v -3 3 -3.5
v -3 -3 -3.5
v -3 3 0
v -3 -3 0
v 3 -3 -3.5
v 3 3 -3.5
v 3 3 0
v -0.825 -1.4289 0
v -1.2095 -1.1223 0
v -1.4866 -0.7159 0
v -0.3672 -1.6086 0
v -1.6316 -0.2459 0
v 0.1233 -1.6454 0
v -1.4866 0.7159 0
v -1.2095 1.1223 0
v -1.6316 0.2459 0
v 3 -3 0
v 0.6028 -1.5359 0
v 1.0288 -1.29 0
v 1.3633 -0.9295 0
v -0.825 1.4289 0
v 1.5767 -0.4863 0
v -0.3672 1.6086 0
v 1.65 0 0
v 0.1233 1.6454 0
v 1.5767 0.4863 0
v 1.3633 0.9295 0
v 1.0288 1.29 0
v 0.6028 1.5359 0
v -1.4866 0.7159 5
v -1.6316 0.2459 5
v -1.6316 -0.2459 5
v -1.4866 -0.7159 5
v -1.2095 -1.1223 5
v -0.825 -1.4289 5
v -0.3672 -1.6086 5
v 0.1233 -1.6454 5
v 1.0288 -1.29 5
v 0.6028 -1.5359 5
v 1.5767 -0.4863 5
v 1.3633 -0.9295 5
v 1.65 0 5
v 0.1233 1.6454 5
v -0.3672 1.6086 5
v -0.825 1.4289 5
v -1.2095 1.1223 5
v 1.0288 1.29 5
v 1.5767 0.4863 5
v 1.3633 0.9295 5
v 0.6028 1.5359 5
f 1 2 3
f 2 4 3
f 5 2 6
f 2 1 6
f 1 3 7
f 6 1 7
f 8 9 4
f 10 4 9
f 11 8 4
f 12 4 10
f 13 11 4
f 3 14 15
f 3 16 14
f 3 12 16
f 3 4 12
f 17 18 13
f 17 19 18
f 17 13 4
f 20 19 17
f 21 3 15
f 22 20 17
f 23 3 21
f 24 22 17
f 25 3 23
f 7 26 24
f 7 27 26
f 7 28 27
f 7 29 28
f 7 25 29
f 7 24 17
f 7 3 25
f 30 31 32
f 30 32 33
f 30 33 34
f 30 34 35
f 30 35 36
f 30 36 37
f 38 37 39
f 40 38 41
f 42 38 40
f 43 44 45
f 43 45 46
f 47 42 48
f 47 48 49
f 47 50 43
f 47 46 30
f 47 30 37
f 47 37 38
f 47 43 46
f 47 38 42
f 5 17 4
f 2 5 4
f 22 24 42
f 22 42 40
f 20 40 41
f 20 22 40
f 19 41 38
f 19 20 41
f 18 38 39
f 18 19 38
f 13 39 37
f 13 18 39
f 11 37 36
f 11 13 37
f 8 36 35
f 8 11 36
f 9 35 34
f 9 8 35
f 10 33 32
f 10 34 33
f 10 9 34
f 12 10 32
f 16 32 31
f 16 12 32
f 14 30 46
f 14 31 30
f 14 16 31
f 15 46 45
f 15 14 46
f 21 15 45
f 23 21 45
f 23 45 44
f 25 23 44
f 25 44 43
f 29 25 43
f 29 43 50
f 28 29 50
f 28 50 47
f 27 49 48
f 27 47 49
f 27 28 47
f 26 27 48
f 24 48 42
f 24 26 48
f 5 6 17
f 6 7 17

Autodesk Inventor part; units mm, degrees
ref_plane "YZ Plane" through (0, 0, 0) normal (1, 0, 0) x (0, 1, 0)
ref_plane "XZ Plane" through (0, 0, 0) normal (0, 1, 0) x (-1, 0, 0)
ref_plane "XY Plane" through (0, 0, 0) normal (0, 0, 1) x (1, 0, 0)
sketch "Sketch1" plane through (0, 0, 0) normal (0, 0, 1) x (1, 0, 0)
  circle A0 centre (0, 0) radius 1.65
  dimension "d0" = 3.3
extrude "Extrusion1" add sketch "Sketch1" along normal blind 5
sketch "Sketch2" plane through (0, 0, 0) normal (0, 0, 1) x (1, 0, 0)
  line L0 (3, -3) -> (-3, -3)
  line L1 (-3, -3) -> (-3, 3)
  line L2 (-3, 3) -> (3, 3)
  line L3 (3, 3) -> (3, -3)
  line L4 (-4.2165, 0) -> (4.1835, 0) projected
  line L5 (0, -4.2) -> (0, 4.2) projected
  point P0 (0, 0)
  point P1 (3, 0)
  point P2 (0, 3)
  dimension "d3" = 6
extrude "Extrusion2" add sketch "Sketch2" against normal blind 3.5
properties part number "Button"
